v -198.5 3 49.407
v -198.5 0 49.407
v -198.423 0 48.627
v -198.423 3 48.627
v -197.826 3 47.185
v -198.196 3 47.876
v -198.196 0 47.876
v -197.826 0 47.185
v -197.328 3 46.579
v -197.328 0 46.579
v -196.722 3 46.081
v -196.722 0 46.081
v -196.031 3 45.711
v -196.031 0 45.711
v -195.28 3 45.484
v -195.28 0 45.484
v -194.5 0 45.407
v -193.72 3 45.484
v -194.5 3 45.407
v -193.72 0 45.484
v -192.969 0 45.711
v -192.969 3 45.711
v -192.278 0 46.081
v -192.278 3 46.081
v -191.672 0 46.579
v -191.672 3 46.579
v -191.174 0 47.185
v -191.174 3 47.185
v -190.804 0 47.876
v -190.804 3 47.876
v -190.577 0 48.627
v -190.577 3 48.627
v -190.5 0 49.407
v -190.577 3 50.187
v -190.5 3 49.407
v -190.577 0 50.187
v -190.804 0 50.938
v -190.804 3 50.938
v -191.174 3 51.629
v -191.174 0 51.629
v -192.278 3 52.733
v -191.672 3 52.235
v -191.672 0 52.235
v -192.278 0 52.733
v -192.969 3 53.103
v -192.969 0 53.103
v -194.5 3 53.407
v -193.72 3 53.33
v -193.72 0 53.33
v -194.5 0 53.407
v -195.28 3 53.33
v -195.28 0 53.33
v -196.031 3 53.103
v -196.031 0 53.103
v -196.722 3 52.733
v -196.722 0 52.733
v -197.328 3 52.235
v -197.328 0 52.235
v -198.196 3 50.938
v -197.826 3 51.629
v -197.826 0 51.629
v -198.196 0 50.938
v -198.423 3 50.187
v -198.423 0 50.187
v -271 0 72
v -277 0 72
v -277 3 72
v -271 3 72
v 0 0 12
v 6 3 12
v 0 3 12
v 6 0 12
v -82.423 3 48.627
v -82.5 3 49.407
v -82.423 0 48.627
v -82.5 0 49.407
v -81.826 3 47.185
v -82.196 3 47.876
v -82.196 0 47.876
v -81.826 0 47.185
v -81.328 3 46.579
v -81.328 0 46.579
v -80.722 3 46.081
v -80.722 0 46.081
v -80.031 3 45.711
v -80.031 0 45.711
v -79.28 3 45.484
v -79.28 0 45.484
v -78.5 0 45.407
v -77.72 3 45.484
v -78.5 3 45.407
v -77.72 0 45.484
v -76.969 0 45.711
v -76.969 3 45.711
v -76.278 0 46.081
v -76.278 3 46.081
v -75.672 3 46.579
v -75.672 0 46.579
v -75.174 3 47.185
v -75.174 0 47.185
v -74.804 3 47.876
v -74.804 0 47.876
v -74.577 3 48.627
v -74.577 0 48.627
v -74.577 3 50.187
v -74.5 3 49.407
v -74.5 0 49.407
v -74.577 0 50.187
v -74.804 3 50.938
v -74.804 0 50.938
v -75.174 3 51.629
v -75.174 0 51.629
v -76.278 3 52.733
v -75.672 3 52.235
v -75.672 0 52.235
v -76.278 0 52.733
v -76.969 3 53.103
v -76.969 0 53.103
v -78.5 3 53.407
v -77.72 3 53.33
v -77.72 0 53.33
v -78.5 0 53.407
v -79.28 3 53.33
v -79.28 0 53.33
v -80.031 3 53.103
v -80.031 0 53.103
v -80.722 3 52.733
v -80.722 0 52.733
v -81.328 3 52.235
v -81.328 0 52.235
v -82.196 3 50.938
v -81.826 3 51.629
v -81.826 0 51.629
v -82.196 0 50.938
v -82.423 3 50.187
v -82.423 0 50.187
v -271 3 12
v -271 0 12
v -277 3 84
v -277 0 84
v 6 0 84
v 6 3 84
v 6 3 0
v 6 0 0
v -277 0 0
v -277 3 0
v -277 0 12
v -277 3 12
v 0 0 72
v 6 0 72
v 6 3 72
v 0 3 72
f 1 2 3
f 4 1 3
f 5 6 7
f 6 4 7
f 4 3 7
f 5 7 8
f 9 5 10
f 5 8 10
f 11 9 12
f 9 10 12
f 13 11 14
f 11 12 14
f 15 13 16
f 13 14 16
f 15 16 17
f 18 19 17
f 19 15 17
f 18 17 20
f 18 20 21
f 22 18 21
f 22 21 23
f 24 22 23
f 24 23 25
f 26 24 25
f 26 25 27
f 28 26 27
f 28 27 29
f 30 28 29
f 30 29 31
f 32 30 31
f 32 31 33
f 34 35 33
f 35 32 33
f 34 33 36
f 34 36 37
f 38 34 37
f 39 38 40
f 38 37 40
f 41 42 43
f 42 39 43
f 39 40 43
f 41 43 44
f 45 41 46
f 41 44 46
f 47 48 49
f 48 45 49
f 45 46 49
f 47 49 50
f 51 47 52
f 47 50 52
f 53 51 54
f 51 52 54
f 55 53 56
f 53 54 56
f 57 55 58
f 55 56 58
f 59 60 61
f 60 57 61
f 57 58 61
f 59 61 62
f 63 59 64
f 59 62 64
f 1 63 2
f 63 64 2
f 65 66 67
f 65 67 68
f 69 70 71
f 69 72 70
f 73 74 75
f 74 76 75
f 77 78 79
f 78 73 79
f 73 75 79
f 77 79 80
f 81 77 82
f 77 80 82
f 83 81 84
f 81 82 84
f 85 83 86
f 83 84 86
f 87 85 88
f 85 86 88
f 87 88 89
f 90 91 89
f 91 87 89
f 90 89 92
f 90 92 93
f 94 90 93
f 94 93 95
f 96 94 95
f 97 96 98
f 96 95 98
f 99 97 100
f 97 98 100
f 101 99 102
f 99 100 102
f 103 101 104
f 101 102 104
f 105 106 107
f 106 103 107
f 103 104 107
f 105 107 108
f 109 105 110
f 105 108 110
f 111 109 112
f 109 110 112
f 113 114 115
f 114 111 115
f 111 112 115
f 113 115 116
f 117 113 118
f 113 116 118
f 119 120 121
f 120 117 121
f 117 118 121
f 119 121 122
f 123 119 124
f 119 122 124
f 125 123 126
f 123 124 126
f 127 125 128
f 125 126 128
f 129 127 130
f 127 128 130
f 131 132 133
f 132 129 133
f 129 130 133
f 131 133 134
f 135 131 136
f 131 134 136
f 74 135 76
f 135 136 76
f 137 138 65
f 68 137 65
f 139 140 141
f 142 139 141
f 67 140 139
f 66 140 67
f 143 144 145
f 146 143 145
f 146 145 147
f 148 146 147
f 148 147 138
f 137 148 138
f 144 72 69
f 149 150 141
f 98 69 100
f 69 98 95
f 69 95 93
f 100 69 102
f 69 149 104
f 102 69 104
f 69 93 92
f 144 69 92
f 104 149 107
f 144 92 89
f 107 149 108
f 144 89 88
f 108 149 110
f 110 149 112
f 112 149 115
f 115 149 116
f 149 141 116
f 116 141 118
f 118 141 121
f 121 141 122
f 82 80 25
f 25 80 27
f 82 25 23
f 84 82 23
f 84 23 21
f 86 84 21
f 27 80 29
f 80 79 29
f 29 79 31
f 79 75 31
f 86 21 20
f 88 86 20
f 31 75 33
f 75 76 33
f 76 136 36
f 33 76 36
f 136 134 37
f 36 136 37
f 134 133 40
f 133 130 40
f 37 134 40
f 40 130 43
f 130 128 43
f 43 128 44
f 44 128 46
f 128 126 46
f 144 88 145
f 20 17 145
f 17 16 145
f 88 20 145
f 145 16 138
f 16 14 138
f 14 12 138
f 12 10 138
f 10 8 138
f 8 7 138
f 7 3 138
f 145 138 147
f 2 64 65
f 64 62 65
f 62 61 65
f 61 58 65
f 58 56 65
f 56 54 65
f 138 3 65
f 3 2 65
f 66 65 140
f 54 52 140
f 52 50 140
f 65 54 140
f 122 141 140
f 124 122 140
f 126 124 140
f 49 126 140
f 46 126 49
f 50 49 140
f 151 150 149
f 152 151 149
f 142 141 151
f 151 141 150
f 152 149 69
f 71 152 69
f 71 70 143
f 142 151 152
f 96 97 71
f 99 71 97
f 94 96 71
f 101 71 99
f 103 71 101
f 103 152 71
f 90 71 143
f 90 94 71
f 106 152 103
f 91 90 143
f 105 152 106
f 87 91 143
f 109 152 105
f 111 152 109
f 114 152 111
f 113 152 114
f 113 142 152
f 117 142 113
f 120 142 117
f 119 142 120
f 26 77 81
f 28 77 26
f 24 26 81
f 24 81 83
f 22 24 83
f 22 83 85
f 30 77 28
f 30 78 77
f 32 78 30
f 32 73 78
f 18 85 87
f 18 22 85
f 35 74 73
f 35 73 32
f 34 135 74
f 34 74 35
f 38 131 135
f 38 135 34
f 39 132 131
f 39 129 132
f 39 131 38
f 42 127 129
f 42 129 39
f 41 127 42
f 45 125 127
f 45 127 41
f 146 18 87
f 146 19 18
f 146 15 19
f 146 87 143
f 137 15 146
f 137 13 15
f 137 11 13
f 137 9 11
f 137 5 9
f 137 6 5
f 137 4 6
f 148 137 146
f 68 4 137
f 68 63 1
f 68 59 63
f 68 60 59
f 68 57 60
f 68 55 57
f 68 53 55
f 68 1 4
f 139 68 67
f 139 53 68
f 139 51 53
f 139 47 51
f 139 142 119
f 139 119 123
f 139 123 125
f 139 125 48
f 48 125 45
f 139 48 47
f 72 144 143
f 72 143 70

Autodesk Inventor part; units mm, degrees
ref_plane "YZ Plane" through (0, 0, 0) normal (1, 0, 0) x (0, 1, 0)
ref_plane "XZ Plane" through (0, 0, 0) normal (0, 1, 0) x (-1, 0, 0)
ref_plane "XY Plane" through (0, 0, 0) normal (0, 0, 1) x (1, 0, 0)
sketch "Sketch1" plane through (0, 0, 0) normal (0, 1, 0) x (-1, 0, 0)
  line L0 (0, 0) -> (271, 0)
  line L1 (271, 0) -> (271, 84)
  line L2 (271, 84) -> (0, 84)
  line L3 (0, 84) -> (0, 0)
  line L4 (135.5, 84) -> (135.5, 0) construction
  line L5 (0, 84) -> (-6, 84)
  line L6 (-6, 84) -> (-6, 72)
  line L7 (-6, 72) -> (0, 72)
  line L8 (0, 72) -> (0, 84)
  line L9 (0, 0) -> (-6, 0)
  line L10 (-6, 0) -> (-6, 12)
  line L11 (-6, 12) -> (0, 12)
  line L12 (0, 12) -> (0, 0)
  line L13 (271, 84) -> (271, 0)
  line L14 (271, 84) -> (277, 84)
  line L15 (277, 84) -> (277, 72)
  line L16 (277, 72) -> (271, 72)
  line L17 (271, 72) -> (271, 84)
  line L18 (271, 0) -> (277, 0)
  line L19 (277, 0) -> (277, 12)
  line L20 (277, 12) -> (271, 12)
  line L21 (271, 12) -> (271, 0)
  circle A0 centre (194.5, 49.407) radius 4
  circle A1 centre (78.5, 49.407) radius 4
  line L22 (194.5, 49.407) -> (78.5, 49.407) construction
  dimension "d0" = 271
  dimension "d1" = 84
  dimension "d2" = 6
  dimension "d3" = 12
  dimension "d4" = 6
  dimension "d5" = 12
  dimension "d8" = 8
  dimension "d9" = 76.5
  dimension "d10" = 8
  dimension "d11" = 116
  dimension "d13" = 34.593
extrude "Extrusion1" add sketch "Sketch1" along normal blind 3
properties part number "flipper-support"
